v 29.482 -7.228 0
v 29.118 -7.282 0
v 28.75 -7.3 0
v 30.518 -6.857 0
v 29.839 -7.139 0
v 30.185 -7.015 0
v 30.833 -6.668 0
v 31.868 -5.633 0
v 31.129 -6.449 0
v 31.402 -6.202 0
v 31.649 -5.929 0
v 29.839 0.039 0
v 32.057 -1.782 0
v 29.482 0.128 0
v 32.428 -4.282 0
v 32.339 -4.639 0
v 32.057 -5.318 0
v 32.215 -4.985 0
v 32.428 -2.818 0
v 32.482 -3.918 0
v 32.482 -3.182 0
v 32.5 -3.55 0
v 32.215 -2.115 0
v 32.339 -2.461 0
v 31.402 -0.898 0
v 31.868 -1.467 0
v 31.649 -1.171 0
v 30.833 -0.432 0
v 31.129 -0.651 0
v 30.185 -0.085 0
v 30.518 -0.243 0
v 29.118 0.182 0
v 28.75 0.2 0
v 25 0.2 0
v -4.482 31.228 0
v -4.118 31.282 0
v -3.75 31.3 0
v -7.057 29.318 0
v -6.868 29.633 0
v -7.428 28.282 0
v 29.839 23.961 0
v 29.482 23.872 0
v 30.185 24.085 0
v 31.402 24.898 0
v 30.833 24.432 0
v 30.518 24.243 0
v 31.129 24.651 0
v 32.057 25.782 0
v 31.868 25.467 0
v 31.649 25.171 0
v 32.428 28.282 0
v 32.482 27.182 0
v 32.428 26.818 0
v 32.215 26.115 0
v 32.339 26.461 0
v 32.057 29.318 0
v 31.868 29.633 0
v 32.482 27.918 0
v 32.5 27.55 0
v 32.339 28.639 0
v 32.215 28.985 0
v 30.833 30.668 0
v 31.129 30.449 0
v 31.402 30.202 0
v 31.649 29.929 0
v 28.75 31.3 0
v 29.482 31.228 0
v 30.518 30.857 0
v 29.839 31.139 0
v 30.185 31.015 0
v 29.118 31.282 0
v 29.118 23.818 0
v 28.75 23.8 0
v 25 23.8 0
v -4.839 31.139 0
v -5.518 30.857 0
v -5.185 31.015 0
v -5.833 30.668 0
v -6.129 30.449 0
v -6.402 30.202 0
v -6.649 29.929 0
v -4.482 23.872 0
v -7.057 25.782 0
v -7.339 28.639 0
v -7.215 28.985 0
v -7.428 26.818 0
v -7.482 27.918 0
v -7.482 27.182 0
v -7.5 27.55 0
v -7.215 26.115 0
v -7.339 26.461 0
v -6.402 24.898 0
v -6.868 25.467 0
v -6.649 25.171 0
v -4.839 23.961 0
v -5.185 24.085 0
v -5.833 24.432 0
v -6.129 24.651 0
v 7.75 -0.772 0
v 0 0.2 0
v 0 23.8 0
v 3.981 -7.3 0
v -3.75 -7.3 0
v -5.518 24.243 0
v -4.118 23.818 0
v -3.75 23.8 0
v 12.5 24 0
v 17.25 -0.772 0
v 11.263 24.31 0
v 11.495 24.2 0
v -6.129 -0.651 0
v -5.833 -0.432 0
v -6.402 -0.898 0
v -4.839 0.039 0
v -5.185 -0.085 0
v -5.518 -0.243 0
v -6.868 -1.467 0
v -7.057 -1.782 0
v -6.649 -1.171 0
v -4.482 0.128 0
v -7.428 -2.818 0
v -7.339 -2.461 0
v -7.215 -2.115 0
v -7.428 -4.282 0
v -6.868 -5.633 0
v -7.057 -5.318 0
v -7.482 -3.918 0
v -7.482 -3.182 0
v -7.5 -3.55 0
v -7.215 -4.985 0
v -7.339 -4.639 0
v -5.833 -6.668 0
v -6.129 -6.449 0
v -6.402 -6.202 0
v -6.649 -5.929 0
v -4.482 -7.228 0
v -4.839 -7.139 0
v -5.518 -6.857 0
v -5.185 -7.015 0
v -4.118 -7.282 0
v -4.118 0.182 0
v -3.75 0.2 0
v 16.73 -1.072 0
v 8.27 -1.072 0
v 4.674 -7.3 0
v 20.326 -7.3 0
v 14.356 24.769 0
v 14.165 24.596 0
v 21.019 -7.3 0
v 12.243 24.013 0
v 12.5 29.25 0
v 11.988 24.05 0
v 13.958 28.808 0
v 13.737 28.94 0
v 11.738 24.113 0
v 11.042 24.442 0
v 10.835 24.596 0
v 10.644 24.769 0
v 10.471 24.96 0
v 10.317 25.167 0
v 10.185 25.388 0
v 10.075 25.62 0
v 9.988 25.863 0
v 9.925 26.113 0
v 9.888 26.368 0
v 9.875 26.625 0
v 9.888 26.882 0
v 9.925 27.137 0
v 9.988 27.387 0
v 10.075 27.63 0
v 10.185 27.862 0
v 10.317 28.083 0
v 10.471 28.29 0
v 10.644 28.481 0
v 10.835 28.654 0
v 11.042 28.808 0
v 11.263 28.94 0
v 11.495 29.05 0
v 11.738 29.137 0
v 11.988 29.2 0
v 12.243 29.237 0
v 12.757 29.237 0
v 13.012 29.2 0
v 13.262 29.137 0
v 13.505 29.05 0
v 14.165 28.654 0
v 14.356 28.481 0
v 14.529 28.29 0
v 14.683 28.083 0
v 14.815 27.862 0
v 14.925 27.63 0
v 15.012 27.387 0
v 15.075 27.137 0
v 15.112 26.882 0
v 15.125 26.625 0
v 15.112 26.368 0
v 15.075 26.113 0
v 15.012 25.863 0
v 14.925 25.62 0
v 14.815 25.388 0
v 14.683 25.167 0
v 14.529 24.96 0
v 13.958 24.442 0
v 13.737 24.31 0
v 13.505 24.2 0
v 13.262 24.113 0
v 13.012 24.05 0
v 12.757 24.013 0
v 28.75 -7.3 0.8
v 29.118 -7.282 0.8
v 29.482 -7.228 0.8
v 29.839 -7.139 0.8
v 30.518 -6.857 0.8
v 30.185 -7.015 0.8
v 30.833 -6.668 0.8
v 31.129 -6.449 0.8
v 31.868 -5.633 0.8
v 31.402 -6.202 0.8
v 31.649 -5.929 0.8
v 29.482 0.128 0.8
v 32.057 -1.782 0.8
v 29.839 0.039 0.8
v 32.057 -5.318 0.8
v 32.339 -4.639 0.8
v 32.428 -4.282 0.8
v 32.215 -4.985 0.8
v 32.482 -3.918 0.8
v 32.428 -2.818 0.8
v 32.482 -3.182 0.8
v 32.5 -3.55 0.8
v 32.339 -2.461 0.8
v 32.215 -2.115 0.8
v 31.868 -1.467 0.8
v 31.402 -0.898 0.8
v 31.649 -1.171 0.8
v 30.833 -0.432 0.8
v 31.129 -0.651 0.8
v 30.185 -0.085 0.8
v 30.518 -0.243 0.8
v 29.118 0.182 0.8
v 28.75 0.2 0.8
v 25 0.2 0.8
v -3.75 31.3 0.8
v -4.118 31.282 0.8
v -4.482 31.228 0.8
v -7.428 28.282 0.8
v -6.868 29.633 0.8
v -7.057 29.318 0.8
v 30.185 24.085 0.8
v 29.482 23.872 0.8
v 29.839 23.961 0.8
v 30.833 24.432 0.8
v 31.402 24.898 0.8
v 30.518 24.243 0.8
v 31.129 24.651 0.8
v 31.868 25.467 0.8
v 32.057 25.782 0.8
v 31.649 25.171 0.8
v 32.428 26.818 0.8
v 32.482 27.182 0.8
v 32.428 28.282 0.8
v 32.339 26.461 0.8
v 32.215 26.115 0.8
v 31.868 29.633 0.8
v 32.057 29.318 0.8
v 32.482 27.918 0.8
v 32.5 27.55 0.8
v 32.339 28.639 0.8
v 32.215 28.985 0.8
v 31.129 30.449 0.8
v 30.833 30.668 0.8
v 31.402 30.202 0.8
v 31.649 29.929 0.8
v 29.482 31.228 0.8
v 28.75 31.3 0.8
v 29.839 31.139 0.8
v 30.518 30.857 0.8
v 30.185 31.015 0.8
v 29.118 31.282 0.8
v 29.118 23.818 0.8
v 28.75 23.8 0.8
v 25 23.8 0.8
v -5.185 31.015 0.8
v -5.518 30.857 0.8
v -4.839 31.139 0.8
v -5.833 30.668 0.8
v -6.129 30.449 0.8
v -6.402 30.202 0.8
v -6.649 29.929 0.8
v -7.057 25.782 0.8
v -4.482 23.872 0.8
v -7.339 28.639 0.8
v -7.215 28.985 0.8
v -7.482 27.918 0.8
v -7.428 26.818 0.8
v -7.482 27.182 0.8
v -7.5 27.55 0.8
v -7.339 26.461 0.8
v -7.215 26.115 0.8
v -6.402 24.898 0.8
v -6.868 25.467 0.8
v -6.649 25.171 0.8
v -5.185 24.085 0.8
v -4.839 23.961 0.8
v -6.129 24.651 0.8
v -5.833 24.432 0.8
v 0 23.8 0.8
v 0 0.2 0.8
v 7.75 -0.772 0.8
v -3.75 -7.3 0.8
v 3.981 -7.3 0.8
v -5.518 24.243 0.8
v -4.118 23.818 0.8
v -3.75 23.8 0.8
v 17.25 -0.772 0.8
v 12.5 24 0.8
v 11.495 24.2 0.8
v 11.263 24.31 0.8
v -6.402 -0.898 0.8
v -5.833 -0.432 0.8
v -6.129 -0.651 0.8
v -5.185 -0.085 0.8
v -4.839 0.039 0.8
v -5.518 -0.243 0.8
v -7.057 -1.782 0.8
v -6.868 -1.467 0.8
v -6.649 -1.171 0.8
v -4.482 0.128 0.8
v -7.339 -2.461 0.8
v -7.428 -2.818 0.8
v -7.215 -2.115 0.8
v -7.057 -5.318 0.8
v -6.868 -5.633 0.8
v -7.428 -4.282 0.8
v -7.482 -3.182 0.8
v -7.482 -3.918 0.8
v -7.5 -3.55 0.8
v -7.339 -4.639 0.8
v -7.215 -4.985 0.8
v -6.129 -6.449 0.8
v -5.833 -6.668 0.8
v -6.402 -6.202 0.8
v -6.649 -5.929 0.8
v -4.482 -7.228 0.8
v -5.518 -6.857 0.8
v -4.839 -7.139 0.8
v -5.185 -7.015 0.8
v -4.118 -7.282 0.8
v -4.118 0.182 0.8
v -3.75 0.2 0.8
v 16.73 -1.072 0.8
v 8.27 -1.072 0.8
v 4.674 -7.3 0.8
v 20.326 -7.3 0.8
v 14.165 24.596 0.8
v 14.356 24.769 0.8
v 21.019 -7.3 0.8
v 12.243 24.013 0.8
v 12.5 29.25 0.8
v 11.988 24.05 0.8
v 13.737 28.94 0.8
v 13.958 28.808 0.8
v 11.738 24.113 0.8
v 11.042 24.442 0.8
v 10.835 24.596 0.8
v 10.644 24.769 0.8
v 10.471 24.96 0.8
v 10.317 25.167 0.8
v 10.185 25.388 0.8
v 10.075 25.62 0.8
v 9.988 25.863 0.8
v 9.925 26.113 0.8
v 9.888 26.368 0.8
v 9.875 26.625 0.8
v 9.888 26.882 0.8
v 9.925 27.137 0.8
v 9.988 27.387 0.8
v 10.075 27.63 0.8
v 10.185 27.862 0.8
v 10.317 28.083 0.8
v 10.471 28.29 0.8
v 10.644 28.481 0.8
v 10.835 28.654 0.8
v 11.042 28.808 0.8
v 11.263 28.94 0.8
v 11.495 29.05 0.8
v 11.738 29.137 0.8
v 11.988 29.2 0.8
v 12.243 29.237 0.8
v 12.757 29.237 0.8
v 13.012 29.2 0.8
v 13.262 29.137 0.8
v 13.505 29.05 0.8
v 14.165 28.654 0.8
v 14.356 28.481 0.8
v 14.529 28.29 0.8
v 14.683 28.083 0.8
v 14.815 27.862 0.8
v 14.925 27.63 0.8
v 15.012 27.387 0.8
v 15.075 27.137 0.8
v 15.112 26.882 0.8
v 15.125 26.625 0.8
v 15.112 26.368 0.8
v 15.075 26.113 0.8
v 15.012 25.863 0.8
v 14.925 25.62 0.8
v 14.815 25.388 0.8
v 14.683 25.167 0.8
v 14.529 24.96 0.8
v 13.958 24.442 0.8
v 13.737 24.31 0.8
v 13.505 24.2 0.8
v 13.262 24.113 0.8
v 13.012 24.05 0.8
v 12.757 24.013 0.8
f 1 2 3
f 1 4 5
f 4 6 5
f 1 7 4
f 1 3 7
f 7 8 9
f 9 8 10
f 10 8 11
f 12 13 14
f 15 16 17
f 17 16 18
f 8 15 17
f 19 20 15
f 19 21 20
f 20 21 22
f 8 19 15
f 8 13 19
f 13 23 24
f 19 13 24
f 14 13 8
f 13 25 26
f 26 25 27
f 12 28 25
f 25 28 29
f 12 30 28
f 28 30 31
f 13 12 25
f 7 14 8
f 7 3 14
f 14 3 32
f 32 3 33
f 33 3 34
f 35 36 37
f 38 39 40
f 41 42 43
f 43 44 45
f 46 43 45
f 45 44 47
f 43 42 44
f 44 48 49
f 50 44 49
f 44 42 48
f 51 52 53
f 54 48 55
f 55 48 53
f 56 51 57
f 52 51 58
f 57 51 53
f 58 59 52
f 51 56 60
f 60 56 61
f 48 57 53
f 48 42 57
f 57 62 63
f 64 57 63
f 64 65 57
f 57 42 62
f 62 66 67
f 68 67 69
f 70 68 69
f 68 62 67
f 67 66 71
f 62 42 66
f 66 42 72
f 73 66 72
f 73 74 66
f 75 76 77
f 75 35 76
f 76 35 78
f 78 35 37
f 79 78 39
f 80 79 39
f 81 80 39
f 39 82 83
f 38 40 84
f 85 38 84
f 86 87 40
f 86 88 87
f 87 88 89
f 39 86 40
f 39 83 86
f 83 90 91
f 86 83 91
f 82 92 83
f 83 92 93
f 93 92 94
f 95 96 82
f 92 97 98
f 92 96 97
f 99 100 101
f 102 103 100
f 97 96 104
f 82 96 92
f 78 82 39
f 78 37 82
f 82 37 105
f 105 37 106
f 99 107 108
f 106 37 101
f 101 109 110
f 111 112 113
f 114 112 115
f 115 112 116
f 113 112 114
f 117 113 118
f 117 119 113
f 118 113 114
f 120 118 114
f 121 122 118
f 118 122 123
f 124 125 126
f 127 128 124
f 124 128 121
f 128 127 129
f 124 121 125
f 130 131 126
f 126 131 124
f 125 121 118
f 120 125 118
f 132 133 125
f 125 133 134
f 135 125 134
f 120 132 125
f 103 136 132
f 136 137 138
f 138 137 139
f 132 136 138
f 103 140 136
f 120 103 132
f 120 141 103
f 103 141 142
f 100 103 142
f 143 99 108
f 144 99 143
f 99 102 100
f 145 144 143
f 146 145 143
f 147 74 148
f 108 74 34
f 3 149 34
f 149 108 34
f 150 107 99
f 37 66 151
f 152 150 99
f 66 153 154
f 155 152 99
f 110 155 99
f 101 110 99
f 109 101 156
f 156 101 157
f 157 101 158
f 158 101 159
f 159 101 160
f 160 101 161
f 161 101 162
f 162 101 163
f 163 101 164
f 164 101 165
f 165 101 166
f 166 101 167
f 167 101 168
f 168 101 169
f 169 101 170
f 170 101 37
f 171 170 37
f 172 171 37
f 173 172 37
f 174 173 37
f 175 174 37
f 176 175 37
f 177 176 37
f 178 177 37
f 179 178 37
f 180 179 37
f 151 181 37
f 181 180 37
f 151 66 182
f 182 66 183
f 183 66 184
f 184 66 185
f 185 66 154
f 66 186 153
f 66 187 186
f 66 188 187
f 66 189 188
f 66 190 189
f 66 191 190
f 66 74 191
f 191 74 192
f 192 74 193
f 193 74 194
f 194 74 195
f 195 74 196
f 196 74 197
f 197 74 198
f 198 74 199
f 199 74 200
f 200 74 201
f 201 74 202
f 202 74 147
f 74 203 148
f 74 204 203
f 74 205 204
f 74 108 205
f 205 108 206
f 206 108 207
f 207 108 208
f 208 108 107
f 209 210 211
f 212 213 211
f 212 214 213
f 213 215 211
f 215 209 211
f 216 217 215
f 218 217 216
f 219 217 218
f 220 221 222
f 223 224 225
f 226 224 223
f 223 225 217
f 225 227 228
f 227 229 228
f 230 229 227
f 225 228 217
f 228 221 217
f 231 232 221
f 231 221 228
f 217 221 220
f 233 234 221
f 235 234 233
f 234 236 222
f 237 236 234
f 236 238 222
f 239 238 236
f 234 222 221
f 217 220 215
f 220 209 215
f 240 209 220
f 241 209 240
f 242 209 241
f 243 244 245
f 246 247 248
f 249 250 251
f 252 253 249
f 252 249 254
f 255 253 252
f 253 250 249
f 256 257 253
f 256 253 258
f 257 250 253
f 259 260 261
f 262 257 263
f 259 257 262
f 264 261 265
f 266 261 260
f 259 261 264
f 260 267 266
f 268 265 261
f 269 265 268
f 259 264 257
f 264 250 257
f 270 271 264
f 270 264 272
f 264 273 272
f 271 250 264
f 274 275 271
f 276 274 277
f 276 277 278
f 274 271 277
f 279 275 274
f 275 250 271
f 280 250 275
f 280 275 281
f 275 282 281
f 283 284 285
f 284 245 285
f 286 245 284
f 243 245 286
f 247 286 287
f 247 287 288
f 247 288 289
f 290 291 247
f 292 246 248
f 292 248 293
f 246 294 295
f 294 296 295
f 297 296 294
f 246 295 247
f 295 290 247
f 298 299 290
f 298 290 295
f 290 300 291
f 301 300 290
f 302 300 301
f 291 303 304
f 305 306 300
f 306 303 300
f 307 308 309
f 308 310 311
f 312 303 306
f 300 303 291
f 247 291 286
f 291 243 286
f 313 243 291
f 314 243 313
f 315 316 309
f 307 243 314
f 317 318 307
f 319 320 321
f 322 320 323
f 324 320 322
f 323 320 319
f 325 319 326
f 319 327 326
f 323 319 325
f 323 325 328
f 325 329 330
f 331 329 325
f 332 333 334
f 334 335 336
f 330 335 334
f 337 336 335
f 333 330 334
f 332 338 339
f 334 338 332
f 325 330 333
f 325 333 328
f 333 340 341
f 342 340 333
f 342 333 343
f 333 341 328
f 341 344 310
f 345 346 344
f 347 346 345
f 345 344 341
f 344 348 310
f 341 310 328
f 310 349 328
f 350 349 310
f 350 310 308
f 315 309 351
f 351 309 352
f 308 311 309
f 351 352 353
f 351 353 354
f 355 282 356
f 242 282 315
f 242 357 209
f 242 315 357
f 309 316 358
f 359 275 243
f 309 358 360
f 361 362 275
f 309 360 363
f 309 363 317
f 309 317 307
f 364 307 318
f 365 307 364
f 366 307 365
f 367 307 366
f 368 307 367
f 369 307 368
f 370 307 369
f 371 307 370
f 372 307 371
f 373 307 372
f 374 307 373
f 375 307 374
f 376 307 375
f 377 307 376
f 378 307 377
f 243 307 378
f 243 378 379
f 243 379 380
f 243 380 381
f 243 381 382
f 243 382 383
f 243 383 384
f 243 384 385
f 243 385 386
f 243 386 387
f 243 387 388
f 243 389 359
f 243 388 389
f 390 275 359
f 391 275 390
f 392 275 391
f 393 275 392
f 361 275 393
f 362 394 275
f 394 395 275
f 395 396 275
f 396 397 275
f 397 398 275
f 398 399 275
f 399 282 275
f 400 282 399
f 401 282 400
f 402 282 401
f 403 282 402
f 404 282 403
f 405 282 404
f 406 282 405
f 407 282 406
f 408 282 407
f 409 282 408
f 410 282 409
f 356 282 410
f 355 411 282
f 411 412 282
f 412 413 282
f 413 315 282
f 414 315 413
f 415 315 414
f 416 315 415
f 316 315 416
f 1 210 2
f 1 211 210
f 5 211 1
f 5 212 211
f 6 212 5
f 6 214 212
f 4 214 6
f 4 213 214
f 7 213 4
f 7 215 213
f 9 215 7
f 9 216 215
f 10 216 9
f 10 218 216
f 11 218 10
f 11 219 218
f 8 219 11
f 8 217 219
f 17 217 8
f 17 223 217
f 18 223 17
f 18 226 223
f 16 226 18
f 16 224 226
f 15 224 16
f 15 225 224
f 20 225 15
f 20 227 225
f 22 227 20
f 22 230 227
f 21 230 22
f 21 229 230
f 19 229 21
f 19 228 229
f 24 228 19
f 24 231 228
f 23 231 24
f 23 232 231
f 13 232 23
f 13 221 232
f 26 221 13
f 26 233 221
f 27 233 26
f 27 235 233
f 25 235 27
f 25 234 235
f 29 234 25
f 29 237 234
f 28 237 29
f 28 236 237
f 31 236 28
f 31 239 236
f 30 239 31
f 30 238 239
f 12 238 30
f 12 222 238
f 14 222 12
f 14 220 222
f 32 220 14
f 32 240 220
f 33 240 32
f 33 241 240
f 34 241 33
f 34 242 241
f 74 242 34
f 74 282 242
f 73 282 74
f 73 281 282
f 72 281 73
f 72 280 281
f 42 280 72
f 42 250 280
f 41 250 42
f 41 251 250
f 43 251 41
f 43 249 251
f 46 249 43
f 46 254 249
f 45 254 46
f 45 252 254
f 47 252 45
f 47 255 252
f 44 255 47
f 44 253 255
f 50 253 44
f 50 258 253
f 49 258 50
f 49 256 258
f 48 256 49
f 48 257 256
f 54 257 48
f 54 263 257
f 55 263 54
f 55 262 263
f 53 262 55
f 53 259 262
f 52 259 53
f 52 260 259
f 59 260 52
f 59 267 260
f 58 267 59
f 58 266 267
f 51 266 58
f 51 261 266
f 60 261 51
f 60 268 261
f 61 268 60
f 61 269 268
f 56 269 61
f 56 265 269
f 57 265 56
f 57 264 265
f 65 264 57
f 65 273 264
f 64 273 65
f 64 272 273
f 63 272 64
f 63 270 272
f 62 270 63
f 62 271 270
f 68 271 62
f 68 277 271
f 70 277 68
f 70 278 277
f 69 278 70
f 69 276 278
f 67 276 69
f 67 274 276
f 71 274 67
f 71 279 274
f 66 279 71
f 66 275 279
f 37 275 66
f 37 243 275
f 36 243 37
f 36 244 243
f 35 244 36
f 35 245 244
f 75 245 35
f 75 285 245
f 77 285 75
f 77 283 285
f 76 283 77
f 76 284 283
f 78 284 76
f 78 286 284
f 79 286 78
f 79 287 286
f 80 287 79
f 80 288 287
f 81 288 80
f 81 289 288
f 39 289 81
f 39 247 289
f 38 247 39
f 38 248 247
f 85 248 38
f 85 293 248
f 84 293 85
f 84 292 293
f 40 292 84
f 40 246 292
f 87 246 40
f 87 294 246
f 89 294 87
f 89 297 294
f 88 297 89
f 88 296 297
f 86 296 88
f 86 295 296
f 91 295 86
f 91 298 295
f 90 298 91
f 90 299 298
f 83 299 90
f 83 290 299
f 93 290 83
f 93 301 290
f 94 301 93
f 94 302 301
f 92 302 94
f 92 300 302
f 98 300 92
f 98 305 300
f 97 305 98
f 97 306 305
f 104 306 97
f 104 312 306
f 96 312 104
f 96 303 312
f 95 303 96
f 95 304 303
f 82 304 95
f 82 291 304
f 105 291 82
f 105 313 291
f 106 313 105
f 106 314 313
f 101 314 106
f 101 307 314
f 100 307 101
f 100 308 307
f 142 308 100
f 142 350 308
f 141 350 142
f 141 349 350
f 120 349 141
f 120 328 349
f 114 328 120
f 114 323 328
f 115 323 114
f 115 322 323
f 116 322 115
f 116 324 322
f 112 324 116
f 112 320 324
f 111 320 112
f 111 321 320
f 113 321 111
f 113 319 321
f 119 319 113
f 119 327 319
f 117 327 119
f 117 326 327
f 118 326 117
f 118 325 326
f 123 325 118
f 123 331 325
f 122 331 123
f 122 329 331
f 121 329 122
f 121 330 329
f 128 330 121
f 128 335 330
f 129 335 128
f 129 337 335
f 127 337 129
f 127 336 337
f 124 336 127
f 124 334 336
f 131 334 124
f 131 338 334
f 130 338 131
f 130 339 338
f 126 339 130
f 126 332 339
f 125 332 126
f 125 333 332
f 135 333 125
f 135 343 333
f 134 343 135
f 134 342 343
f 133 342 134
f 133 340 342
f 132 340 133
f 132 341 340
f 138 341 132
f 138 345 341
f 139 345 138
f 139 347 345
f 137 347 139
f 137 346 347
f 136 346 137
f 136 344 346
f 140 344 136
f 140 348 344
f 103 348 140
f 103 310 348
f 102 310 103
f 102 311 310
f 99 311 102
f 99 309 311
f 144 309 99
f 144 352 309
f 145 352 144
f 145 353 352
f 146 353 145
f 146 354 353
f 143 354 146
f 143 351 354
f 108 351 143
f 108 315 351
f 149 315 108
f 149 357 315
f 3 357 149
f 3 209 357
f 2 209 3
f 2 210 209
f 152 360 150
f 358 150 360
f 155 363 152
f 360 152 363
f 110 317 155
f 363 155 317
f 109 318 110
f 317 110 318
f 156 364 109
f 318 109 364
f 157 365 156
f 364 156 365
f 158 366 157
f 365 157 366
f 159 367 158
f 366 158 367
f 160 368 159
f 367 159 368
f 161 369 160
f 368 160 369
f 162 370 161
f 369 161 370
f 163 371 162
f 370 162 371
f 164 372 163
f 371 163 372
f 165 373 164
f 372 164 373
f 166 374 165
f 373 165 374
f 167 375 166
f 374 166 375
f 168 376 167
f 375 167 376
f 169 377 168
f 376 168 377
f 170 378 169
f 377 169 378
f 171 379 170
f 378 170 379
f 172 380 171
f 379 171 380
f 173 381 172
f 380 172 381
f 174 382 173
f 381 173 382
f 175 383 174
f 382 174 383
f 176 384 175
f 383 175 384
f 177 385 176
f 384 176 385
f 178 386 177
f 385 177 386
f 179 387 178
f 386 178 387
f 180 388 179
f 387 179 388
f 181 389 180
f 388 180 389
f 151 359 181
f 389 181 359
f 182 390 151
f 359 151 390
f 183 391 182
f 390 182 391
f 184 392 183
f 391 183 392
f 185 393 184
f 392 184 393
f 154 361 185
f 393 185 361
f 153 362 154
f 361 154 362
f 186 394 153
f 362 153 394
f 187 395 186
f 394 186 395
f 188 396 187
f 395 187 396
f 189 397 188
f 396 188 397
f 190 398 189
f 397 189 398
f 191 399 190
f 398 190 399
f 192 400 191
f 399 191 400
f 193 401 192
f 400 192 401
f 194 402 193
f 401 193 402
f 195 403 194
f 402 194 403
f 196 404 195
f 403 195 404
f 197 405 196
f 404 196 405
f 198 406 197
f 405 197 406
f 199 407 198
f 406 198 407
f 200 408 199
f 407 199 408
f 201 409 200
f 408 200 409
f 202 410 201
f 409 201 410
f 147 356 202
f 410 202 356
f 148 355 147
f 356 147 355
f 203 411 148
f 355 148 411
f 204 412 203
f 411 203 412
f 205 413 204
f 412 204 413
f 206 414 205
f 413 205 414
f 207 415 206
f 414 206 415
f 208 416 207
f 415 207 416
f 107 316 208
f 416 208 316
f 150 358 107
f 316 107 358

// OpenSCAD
/*
Script Name: EmSCAD Embroidery Floss Bobbin
Description: Parametric card bobbin to wrap embroidry floss
Repository: https://github.com/em-sea/EmSCAD/
Copyright (C) 2026 em-sea
SPDX-License-Identifier: GPL-3.0-or-later
*/

/* [all sizes in mm] */
core_width  = 25;
core_length = 24;
thickness   = 0.8;
thread      = 0.6;
thread_slit = 8;
flange_size = 7.5;

/* [Hidden] */
$fn = 64;
EPSILON     = 0.2;

hole = flange_size * 0.7;

linear_extrude(height = thickness) {
    difference() {
        union() {
            square([core_width, core_length]);
            for (y = [0, core_length]) {
                hull() {
                    translate([-flange_size / 2, y + (y == 0 ? -flange_size/2 + EPSILON : flange_size/2 - EPSILON)]) 
                        circle(d = flange_size);
                    translate([core_width + flange_size / 2, y + (y == 0 ? -flange_size/2 + EPSILON : flange_size/2 - EPSILON)]) 
                        circle(d = flange_size);
                }
            }
        }
        translate([core_width / 2, core_length + hole / 2]) 
            circle(d = hole);

translate([flange_size / 2, -flange_size - EPSILON]) 
    rotate([0, 0, -30]) 
    square([thread, thread_slit]);

translate([core_width, 0]) 
    mirror([1, 0, 0]) 
    translate([flange_size / 2, -flange_size - EPSILON]) 
    rotate([0, 0, -30]) 
    square([thread, thread_slit]);
    }
}
